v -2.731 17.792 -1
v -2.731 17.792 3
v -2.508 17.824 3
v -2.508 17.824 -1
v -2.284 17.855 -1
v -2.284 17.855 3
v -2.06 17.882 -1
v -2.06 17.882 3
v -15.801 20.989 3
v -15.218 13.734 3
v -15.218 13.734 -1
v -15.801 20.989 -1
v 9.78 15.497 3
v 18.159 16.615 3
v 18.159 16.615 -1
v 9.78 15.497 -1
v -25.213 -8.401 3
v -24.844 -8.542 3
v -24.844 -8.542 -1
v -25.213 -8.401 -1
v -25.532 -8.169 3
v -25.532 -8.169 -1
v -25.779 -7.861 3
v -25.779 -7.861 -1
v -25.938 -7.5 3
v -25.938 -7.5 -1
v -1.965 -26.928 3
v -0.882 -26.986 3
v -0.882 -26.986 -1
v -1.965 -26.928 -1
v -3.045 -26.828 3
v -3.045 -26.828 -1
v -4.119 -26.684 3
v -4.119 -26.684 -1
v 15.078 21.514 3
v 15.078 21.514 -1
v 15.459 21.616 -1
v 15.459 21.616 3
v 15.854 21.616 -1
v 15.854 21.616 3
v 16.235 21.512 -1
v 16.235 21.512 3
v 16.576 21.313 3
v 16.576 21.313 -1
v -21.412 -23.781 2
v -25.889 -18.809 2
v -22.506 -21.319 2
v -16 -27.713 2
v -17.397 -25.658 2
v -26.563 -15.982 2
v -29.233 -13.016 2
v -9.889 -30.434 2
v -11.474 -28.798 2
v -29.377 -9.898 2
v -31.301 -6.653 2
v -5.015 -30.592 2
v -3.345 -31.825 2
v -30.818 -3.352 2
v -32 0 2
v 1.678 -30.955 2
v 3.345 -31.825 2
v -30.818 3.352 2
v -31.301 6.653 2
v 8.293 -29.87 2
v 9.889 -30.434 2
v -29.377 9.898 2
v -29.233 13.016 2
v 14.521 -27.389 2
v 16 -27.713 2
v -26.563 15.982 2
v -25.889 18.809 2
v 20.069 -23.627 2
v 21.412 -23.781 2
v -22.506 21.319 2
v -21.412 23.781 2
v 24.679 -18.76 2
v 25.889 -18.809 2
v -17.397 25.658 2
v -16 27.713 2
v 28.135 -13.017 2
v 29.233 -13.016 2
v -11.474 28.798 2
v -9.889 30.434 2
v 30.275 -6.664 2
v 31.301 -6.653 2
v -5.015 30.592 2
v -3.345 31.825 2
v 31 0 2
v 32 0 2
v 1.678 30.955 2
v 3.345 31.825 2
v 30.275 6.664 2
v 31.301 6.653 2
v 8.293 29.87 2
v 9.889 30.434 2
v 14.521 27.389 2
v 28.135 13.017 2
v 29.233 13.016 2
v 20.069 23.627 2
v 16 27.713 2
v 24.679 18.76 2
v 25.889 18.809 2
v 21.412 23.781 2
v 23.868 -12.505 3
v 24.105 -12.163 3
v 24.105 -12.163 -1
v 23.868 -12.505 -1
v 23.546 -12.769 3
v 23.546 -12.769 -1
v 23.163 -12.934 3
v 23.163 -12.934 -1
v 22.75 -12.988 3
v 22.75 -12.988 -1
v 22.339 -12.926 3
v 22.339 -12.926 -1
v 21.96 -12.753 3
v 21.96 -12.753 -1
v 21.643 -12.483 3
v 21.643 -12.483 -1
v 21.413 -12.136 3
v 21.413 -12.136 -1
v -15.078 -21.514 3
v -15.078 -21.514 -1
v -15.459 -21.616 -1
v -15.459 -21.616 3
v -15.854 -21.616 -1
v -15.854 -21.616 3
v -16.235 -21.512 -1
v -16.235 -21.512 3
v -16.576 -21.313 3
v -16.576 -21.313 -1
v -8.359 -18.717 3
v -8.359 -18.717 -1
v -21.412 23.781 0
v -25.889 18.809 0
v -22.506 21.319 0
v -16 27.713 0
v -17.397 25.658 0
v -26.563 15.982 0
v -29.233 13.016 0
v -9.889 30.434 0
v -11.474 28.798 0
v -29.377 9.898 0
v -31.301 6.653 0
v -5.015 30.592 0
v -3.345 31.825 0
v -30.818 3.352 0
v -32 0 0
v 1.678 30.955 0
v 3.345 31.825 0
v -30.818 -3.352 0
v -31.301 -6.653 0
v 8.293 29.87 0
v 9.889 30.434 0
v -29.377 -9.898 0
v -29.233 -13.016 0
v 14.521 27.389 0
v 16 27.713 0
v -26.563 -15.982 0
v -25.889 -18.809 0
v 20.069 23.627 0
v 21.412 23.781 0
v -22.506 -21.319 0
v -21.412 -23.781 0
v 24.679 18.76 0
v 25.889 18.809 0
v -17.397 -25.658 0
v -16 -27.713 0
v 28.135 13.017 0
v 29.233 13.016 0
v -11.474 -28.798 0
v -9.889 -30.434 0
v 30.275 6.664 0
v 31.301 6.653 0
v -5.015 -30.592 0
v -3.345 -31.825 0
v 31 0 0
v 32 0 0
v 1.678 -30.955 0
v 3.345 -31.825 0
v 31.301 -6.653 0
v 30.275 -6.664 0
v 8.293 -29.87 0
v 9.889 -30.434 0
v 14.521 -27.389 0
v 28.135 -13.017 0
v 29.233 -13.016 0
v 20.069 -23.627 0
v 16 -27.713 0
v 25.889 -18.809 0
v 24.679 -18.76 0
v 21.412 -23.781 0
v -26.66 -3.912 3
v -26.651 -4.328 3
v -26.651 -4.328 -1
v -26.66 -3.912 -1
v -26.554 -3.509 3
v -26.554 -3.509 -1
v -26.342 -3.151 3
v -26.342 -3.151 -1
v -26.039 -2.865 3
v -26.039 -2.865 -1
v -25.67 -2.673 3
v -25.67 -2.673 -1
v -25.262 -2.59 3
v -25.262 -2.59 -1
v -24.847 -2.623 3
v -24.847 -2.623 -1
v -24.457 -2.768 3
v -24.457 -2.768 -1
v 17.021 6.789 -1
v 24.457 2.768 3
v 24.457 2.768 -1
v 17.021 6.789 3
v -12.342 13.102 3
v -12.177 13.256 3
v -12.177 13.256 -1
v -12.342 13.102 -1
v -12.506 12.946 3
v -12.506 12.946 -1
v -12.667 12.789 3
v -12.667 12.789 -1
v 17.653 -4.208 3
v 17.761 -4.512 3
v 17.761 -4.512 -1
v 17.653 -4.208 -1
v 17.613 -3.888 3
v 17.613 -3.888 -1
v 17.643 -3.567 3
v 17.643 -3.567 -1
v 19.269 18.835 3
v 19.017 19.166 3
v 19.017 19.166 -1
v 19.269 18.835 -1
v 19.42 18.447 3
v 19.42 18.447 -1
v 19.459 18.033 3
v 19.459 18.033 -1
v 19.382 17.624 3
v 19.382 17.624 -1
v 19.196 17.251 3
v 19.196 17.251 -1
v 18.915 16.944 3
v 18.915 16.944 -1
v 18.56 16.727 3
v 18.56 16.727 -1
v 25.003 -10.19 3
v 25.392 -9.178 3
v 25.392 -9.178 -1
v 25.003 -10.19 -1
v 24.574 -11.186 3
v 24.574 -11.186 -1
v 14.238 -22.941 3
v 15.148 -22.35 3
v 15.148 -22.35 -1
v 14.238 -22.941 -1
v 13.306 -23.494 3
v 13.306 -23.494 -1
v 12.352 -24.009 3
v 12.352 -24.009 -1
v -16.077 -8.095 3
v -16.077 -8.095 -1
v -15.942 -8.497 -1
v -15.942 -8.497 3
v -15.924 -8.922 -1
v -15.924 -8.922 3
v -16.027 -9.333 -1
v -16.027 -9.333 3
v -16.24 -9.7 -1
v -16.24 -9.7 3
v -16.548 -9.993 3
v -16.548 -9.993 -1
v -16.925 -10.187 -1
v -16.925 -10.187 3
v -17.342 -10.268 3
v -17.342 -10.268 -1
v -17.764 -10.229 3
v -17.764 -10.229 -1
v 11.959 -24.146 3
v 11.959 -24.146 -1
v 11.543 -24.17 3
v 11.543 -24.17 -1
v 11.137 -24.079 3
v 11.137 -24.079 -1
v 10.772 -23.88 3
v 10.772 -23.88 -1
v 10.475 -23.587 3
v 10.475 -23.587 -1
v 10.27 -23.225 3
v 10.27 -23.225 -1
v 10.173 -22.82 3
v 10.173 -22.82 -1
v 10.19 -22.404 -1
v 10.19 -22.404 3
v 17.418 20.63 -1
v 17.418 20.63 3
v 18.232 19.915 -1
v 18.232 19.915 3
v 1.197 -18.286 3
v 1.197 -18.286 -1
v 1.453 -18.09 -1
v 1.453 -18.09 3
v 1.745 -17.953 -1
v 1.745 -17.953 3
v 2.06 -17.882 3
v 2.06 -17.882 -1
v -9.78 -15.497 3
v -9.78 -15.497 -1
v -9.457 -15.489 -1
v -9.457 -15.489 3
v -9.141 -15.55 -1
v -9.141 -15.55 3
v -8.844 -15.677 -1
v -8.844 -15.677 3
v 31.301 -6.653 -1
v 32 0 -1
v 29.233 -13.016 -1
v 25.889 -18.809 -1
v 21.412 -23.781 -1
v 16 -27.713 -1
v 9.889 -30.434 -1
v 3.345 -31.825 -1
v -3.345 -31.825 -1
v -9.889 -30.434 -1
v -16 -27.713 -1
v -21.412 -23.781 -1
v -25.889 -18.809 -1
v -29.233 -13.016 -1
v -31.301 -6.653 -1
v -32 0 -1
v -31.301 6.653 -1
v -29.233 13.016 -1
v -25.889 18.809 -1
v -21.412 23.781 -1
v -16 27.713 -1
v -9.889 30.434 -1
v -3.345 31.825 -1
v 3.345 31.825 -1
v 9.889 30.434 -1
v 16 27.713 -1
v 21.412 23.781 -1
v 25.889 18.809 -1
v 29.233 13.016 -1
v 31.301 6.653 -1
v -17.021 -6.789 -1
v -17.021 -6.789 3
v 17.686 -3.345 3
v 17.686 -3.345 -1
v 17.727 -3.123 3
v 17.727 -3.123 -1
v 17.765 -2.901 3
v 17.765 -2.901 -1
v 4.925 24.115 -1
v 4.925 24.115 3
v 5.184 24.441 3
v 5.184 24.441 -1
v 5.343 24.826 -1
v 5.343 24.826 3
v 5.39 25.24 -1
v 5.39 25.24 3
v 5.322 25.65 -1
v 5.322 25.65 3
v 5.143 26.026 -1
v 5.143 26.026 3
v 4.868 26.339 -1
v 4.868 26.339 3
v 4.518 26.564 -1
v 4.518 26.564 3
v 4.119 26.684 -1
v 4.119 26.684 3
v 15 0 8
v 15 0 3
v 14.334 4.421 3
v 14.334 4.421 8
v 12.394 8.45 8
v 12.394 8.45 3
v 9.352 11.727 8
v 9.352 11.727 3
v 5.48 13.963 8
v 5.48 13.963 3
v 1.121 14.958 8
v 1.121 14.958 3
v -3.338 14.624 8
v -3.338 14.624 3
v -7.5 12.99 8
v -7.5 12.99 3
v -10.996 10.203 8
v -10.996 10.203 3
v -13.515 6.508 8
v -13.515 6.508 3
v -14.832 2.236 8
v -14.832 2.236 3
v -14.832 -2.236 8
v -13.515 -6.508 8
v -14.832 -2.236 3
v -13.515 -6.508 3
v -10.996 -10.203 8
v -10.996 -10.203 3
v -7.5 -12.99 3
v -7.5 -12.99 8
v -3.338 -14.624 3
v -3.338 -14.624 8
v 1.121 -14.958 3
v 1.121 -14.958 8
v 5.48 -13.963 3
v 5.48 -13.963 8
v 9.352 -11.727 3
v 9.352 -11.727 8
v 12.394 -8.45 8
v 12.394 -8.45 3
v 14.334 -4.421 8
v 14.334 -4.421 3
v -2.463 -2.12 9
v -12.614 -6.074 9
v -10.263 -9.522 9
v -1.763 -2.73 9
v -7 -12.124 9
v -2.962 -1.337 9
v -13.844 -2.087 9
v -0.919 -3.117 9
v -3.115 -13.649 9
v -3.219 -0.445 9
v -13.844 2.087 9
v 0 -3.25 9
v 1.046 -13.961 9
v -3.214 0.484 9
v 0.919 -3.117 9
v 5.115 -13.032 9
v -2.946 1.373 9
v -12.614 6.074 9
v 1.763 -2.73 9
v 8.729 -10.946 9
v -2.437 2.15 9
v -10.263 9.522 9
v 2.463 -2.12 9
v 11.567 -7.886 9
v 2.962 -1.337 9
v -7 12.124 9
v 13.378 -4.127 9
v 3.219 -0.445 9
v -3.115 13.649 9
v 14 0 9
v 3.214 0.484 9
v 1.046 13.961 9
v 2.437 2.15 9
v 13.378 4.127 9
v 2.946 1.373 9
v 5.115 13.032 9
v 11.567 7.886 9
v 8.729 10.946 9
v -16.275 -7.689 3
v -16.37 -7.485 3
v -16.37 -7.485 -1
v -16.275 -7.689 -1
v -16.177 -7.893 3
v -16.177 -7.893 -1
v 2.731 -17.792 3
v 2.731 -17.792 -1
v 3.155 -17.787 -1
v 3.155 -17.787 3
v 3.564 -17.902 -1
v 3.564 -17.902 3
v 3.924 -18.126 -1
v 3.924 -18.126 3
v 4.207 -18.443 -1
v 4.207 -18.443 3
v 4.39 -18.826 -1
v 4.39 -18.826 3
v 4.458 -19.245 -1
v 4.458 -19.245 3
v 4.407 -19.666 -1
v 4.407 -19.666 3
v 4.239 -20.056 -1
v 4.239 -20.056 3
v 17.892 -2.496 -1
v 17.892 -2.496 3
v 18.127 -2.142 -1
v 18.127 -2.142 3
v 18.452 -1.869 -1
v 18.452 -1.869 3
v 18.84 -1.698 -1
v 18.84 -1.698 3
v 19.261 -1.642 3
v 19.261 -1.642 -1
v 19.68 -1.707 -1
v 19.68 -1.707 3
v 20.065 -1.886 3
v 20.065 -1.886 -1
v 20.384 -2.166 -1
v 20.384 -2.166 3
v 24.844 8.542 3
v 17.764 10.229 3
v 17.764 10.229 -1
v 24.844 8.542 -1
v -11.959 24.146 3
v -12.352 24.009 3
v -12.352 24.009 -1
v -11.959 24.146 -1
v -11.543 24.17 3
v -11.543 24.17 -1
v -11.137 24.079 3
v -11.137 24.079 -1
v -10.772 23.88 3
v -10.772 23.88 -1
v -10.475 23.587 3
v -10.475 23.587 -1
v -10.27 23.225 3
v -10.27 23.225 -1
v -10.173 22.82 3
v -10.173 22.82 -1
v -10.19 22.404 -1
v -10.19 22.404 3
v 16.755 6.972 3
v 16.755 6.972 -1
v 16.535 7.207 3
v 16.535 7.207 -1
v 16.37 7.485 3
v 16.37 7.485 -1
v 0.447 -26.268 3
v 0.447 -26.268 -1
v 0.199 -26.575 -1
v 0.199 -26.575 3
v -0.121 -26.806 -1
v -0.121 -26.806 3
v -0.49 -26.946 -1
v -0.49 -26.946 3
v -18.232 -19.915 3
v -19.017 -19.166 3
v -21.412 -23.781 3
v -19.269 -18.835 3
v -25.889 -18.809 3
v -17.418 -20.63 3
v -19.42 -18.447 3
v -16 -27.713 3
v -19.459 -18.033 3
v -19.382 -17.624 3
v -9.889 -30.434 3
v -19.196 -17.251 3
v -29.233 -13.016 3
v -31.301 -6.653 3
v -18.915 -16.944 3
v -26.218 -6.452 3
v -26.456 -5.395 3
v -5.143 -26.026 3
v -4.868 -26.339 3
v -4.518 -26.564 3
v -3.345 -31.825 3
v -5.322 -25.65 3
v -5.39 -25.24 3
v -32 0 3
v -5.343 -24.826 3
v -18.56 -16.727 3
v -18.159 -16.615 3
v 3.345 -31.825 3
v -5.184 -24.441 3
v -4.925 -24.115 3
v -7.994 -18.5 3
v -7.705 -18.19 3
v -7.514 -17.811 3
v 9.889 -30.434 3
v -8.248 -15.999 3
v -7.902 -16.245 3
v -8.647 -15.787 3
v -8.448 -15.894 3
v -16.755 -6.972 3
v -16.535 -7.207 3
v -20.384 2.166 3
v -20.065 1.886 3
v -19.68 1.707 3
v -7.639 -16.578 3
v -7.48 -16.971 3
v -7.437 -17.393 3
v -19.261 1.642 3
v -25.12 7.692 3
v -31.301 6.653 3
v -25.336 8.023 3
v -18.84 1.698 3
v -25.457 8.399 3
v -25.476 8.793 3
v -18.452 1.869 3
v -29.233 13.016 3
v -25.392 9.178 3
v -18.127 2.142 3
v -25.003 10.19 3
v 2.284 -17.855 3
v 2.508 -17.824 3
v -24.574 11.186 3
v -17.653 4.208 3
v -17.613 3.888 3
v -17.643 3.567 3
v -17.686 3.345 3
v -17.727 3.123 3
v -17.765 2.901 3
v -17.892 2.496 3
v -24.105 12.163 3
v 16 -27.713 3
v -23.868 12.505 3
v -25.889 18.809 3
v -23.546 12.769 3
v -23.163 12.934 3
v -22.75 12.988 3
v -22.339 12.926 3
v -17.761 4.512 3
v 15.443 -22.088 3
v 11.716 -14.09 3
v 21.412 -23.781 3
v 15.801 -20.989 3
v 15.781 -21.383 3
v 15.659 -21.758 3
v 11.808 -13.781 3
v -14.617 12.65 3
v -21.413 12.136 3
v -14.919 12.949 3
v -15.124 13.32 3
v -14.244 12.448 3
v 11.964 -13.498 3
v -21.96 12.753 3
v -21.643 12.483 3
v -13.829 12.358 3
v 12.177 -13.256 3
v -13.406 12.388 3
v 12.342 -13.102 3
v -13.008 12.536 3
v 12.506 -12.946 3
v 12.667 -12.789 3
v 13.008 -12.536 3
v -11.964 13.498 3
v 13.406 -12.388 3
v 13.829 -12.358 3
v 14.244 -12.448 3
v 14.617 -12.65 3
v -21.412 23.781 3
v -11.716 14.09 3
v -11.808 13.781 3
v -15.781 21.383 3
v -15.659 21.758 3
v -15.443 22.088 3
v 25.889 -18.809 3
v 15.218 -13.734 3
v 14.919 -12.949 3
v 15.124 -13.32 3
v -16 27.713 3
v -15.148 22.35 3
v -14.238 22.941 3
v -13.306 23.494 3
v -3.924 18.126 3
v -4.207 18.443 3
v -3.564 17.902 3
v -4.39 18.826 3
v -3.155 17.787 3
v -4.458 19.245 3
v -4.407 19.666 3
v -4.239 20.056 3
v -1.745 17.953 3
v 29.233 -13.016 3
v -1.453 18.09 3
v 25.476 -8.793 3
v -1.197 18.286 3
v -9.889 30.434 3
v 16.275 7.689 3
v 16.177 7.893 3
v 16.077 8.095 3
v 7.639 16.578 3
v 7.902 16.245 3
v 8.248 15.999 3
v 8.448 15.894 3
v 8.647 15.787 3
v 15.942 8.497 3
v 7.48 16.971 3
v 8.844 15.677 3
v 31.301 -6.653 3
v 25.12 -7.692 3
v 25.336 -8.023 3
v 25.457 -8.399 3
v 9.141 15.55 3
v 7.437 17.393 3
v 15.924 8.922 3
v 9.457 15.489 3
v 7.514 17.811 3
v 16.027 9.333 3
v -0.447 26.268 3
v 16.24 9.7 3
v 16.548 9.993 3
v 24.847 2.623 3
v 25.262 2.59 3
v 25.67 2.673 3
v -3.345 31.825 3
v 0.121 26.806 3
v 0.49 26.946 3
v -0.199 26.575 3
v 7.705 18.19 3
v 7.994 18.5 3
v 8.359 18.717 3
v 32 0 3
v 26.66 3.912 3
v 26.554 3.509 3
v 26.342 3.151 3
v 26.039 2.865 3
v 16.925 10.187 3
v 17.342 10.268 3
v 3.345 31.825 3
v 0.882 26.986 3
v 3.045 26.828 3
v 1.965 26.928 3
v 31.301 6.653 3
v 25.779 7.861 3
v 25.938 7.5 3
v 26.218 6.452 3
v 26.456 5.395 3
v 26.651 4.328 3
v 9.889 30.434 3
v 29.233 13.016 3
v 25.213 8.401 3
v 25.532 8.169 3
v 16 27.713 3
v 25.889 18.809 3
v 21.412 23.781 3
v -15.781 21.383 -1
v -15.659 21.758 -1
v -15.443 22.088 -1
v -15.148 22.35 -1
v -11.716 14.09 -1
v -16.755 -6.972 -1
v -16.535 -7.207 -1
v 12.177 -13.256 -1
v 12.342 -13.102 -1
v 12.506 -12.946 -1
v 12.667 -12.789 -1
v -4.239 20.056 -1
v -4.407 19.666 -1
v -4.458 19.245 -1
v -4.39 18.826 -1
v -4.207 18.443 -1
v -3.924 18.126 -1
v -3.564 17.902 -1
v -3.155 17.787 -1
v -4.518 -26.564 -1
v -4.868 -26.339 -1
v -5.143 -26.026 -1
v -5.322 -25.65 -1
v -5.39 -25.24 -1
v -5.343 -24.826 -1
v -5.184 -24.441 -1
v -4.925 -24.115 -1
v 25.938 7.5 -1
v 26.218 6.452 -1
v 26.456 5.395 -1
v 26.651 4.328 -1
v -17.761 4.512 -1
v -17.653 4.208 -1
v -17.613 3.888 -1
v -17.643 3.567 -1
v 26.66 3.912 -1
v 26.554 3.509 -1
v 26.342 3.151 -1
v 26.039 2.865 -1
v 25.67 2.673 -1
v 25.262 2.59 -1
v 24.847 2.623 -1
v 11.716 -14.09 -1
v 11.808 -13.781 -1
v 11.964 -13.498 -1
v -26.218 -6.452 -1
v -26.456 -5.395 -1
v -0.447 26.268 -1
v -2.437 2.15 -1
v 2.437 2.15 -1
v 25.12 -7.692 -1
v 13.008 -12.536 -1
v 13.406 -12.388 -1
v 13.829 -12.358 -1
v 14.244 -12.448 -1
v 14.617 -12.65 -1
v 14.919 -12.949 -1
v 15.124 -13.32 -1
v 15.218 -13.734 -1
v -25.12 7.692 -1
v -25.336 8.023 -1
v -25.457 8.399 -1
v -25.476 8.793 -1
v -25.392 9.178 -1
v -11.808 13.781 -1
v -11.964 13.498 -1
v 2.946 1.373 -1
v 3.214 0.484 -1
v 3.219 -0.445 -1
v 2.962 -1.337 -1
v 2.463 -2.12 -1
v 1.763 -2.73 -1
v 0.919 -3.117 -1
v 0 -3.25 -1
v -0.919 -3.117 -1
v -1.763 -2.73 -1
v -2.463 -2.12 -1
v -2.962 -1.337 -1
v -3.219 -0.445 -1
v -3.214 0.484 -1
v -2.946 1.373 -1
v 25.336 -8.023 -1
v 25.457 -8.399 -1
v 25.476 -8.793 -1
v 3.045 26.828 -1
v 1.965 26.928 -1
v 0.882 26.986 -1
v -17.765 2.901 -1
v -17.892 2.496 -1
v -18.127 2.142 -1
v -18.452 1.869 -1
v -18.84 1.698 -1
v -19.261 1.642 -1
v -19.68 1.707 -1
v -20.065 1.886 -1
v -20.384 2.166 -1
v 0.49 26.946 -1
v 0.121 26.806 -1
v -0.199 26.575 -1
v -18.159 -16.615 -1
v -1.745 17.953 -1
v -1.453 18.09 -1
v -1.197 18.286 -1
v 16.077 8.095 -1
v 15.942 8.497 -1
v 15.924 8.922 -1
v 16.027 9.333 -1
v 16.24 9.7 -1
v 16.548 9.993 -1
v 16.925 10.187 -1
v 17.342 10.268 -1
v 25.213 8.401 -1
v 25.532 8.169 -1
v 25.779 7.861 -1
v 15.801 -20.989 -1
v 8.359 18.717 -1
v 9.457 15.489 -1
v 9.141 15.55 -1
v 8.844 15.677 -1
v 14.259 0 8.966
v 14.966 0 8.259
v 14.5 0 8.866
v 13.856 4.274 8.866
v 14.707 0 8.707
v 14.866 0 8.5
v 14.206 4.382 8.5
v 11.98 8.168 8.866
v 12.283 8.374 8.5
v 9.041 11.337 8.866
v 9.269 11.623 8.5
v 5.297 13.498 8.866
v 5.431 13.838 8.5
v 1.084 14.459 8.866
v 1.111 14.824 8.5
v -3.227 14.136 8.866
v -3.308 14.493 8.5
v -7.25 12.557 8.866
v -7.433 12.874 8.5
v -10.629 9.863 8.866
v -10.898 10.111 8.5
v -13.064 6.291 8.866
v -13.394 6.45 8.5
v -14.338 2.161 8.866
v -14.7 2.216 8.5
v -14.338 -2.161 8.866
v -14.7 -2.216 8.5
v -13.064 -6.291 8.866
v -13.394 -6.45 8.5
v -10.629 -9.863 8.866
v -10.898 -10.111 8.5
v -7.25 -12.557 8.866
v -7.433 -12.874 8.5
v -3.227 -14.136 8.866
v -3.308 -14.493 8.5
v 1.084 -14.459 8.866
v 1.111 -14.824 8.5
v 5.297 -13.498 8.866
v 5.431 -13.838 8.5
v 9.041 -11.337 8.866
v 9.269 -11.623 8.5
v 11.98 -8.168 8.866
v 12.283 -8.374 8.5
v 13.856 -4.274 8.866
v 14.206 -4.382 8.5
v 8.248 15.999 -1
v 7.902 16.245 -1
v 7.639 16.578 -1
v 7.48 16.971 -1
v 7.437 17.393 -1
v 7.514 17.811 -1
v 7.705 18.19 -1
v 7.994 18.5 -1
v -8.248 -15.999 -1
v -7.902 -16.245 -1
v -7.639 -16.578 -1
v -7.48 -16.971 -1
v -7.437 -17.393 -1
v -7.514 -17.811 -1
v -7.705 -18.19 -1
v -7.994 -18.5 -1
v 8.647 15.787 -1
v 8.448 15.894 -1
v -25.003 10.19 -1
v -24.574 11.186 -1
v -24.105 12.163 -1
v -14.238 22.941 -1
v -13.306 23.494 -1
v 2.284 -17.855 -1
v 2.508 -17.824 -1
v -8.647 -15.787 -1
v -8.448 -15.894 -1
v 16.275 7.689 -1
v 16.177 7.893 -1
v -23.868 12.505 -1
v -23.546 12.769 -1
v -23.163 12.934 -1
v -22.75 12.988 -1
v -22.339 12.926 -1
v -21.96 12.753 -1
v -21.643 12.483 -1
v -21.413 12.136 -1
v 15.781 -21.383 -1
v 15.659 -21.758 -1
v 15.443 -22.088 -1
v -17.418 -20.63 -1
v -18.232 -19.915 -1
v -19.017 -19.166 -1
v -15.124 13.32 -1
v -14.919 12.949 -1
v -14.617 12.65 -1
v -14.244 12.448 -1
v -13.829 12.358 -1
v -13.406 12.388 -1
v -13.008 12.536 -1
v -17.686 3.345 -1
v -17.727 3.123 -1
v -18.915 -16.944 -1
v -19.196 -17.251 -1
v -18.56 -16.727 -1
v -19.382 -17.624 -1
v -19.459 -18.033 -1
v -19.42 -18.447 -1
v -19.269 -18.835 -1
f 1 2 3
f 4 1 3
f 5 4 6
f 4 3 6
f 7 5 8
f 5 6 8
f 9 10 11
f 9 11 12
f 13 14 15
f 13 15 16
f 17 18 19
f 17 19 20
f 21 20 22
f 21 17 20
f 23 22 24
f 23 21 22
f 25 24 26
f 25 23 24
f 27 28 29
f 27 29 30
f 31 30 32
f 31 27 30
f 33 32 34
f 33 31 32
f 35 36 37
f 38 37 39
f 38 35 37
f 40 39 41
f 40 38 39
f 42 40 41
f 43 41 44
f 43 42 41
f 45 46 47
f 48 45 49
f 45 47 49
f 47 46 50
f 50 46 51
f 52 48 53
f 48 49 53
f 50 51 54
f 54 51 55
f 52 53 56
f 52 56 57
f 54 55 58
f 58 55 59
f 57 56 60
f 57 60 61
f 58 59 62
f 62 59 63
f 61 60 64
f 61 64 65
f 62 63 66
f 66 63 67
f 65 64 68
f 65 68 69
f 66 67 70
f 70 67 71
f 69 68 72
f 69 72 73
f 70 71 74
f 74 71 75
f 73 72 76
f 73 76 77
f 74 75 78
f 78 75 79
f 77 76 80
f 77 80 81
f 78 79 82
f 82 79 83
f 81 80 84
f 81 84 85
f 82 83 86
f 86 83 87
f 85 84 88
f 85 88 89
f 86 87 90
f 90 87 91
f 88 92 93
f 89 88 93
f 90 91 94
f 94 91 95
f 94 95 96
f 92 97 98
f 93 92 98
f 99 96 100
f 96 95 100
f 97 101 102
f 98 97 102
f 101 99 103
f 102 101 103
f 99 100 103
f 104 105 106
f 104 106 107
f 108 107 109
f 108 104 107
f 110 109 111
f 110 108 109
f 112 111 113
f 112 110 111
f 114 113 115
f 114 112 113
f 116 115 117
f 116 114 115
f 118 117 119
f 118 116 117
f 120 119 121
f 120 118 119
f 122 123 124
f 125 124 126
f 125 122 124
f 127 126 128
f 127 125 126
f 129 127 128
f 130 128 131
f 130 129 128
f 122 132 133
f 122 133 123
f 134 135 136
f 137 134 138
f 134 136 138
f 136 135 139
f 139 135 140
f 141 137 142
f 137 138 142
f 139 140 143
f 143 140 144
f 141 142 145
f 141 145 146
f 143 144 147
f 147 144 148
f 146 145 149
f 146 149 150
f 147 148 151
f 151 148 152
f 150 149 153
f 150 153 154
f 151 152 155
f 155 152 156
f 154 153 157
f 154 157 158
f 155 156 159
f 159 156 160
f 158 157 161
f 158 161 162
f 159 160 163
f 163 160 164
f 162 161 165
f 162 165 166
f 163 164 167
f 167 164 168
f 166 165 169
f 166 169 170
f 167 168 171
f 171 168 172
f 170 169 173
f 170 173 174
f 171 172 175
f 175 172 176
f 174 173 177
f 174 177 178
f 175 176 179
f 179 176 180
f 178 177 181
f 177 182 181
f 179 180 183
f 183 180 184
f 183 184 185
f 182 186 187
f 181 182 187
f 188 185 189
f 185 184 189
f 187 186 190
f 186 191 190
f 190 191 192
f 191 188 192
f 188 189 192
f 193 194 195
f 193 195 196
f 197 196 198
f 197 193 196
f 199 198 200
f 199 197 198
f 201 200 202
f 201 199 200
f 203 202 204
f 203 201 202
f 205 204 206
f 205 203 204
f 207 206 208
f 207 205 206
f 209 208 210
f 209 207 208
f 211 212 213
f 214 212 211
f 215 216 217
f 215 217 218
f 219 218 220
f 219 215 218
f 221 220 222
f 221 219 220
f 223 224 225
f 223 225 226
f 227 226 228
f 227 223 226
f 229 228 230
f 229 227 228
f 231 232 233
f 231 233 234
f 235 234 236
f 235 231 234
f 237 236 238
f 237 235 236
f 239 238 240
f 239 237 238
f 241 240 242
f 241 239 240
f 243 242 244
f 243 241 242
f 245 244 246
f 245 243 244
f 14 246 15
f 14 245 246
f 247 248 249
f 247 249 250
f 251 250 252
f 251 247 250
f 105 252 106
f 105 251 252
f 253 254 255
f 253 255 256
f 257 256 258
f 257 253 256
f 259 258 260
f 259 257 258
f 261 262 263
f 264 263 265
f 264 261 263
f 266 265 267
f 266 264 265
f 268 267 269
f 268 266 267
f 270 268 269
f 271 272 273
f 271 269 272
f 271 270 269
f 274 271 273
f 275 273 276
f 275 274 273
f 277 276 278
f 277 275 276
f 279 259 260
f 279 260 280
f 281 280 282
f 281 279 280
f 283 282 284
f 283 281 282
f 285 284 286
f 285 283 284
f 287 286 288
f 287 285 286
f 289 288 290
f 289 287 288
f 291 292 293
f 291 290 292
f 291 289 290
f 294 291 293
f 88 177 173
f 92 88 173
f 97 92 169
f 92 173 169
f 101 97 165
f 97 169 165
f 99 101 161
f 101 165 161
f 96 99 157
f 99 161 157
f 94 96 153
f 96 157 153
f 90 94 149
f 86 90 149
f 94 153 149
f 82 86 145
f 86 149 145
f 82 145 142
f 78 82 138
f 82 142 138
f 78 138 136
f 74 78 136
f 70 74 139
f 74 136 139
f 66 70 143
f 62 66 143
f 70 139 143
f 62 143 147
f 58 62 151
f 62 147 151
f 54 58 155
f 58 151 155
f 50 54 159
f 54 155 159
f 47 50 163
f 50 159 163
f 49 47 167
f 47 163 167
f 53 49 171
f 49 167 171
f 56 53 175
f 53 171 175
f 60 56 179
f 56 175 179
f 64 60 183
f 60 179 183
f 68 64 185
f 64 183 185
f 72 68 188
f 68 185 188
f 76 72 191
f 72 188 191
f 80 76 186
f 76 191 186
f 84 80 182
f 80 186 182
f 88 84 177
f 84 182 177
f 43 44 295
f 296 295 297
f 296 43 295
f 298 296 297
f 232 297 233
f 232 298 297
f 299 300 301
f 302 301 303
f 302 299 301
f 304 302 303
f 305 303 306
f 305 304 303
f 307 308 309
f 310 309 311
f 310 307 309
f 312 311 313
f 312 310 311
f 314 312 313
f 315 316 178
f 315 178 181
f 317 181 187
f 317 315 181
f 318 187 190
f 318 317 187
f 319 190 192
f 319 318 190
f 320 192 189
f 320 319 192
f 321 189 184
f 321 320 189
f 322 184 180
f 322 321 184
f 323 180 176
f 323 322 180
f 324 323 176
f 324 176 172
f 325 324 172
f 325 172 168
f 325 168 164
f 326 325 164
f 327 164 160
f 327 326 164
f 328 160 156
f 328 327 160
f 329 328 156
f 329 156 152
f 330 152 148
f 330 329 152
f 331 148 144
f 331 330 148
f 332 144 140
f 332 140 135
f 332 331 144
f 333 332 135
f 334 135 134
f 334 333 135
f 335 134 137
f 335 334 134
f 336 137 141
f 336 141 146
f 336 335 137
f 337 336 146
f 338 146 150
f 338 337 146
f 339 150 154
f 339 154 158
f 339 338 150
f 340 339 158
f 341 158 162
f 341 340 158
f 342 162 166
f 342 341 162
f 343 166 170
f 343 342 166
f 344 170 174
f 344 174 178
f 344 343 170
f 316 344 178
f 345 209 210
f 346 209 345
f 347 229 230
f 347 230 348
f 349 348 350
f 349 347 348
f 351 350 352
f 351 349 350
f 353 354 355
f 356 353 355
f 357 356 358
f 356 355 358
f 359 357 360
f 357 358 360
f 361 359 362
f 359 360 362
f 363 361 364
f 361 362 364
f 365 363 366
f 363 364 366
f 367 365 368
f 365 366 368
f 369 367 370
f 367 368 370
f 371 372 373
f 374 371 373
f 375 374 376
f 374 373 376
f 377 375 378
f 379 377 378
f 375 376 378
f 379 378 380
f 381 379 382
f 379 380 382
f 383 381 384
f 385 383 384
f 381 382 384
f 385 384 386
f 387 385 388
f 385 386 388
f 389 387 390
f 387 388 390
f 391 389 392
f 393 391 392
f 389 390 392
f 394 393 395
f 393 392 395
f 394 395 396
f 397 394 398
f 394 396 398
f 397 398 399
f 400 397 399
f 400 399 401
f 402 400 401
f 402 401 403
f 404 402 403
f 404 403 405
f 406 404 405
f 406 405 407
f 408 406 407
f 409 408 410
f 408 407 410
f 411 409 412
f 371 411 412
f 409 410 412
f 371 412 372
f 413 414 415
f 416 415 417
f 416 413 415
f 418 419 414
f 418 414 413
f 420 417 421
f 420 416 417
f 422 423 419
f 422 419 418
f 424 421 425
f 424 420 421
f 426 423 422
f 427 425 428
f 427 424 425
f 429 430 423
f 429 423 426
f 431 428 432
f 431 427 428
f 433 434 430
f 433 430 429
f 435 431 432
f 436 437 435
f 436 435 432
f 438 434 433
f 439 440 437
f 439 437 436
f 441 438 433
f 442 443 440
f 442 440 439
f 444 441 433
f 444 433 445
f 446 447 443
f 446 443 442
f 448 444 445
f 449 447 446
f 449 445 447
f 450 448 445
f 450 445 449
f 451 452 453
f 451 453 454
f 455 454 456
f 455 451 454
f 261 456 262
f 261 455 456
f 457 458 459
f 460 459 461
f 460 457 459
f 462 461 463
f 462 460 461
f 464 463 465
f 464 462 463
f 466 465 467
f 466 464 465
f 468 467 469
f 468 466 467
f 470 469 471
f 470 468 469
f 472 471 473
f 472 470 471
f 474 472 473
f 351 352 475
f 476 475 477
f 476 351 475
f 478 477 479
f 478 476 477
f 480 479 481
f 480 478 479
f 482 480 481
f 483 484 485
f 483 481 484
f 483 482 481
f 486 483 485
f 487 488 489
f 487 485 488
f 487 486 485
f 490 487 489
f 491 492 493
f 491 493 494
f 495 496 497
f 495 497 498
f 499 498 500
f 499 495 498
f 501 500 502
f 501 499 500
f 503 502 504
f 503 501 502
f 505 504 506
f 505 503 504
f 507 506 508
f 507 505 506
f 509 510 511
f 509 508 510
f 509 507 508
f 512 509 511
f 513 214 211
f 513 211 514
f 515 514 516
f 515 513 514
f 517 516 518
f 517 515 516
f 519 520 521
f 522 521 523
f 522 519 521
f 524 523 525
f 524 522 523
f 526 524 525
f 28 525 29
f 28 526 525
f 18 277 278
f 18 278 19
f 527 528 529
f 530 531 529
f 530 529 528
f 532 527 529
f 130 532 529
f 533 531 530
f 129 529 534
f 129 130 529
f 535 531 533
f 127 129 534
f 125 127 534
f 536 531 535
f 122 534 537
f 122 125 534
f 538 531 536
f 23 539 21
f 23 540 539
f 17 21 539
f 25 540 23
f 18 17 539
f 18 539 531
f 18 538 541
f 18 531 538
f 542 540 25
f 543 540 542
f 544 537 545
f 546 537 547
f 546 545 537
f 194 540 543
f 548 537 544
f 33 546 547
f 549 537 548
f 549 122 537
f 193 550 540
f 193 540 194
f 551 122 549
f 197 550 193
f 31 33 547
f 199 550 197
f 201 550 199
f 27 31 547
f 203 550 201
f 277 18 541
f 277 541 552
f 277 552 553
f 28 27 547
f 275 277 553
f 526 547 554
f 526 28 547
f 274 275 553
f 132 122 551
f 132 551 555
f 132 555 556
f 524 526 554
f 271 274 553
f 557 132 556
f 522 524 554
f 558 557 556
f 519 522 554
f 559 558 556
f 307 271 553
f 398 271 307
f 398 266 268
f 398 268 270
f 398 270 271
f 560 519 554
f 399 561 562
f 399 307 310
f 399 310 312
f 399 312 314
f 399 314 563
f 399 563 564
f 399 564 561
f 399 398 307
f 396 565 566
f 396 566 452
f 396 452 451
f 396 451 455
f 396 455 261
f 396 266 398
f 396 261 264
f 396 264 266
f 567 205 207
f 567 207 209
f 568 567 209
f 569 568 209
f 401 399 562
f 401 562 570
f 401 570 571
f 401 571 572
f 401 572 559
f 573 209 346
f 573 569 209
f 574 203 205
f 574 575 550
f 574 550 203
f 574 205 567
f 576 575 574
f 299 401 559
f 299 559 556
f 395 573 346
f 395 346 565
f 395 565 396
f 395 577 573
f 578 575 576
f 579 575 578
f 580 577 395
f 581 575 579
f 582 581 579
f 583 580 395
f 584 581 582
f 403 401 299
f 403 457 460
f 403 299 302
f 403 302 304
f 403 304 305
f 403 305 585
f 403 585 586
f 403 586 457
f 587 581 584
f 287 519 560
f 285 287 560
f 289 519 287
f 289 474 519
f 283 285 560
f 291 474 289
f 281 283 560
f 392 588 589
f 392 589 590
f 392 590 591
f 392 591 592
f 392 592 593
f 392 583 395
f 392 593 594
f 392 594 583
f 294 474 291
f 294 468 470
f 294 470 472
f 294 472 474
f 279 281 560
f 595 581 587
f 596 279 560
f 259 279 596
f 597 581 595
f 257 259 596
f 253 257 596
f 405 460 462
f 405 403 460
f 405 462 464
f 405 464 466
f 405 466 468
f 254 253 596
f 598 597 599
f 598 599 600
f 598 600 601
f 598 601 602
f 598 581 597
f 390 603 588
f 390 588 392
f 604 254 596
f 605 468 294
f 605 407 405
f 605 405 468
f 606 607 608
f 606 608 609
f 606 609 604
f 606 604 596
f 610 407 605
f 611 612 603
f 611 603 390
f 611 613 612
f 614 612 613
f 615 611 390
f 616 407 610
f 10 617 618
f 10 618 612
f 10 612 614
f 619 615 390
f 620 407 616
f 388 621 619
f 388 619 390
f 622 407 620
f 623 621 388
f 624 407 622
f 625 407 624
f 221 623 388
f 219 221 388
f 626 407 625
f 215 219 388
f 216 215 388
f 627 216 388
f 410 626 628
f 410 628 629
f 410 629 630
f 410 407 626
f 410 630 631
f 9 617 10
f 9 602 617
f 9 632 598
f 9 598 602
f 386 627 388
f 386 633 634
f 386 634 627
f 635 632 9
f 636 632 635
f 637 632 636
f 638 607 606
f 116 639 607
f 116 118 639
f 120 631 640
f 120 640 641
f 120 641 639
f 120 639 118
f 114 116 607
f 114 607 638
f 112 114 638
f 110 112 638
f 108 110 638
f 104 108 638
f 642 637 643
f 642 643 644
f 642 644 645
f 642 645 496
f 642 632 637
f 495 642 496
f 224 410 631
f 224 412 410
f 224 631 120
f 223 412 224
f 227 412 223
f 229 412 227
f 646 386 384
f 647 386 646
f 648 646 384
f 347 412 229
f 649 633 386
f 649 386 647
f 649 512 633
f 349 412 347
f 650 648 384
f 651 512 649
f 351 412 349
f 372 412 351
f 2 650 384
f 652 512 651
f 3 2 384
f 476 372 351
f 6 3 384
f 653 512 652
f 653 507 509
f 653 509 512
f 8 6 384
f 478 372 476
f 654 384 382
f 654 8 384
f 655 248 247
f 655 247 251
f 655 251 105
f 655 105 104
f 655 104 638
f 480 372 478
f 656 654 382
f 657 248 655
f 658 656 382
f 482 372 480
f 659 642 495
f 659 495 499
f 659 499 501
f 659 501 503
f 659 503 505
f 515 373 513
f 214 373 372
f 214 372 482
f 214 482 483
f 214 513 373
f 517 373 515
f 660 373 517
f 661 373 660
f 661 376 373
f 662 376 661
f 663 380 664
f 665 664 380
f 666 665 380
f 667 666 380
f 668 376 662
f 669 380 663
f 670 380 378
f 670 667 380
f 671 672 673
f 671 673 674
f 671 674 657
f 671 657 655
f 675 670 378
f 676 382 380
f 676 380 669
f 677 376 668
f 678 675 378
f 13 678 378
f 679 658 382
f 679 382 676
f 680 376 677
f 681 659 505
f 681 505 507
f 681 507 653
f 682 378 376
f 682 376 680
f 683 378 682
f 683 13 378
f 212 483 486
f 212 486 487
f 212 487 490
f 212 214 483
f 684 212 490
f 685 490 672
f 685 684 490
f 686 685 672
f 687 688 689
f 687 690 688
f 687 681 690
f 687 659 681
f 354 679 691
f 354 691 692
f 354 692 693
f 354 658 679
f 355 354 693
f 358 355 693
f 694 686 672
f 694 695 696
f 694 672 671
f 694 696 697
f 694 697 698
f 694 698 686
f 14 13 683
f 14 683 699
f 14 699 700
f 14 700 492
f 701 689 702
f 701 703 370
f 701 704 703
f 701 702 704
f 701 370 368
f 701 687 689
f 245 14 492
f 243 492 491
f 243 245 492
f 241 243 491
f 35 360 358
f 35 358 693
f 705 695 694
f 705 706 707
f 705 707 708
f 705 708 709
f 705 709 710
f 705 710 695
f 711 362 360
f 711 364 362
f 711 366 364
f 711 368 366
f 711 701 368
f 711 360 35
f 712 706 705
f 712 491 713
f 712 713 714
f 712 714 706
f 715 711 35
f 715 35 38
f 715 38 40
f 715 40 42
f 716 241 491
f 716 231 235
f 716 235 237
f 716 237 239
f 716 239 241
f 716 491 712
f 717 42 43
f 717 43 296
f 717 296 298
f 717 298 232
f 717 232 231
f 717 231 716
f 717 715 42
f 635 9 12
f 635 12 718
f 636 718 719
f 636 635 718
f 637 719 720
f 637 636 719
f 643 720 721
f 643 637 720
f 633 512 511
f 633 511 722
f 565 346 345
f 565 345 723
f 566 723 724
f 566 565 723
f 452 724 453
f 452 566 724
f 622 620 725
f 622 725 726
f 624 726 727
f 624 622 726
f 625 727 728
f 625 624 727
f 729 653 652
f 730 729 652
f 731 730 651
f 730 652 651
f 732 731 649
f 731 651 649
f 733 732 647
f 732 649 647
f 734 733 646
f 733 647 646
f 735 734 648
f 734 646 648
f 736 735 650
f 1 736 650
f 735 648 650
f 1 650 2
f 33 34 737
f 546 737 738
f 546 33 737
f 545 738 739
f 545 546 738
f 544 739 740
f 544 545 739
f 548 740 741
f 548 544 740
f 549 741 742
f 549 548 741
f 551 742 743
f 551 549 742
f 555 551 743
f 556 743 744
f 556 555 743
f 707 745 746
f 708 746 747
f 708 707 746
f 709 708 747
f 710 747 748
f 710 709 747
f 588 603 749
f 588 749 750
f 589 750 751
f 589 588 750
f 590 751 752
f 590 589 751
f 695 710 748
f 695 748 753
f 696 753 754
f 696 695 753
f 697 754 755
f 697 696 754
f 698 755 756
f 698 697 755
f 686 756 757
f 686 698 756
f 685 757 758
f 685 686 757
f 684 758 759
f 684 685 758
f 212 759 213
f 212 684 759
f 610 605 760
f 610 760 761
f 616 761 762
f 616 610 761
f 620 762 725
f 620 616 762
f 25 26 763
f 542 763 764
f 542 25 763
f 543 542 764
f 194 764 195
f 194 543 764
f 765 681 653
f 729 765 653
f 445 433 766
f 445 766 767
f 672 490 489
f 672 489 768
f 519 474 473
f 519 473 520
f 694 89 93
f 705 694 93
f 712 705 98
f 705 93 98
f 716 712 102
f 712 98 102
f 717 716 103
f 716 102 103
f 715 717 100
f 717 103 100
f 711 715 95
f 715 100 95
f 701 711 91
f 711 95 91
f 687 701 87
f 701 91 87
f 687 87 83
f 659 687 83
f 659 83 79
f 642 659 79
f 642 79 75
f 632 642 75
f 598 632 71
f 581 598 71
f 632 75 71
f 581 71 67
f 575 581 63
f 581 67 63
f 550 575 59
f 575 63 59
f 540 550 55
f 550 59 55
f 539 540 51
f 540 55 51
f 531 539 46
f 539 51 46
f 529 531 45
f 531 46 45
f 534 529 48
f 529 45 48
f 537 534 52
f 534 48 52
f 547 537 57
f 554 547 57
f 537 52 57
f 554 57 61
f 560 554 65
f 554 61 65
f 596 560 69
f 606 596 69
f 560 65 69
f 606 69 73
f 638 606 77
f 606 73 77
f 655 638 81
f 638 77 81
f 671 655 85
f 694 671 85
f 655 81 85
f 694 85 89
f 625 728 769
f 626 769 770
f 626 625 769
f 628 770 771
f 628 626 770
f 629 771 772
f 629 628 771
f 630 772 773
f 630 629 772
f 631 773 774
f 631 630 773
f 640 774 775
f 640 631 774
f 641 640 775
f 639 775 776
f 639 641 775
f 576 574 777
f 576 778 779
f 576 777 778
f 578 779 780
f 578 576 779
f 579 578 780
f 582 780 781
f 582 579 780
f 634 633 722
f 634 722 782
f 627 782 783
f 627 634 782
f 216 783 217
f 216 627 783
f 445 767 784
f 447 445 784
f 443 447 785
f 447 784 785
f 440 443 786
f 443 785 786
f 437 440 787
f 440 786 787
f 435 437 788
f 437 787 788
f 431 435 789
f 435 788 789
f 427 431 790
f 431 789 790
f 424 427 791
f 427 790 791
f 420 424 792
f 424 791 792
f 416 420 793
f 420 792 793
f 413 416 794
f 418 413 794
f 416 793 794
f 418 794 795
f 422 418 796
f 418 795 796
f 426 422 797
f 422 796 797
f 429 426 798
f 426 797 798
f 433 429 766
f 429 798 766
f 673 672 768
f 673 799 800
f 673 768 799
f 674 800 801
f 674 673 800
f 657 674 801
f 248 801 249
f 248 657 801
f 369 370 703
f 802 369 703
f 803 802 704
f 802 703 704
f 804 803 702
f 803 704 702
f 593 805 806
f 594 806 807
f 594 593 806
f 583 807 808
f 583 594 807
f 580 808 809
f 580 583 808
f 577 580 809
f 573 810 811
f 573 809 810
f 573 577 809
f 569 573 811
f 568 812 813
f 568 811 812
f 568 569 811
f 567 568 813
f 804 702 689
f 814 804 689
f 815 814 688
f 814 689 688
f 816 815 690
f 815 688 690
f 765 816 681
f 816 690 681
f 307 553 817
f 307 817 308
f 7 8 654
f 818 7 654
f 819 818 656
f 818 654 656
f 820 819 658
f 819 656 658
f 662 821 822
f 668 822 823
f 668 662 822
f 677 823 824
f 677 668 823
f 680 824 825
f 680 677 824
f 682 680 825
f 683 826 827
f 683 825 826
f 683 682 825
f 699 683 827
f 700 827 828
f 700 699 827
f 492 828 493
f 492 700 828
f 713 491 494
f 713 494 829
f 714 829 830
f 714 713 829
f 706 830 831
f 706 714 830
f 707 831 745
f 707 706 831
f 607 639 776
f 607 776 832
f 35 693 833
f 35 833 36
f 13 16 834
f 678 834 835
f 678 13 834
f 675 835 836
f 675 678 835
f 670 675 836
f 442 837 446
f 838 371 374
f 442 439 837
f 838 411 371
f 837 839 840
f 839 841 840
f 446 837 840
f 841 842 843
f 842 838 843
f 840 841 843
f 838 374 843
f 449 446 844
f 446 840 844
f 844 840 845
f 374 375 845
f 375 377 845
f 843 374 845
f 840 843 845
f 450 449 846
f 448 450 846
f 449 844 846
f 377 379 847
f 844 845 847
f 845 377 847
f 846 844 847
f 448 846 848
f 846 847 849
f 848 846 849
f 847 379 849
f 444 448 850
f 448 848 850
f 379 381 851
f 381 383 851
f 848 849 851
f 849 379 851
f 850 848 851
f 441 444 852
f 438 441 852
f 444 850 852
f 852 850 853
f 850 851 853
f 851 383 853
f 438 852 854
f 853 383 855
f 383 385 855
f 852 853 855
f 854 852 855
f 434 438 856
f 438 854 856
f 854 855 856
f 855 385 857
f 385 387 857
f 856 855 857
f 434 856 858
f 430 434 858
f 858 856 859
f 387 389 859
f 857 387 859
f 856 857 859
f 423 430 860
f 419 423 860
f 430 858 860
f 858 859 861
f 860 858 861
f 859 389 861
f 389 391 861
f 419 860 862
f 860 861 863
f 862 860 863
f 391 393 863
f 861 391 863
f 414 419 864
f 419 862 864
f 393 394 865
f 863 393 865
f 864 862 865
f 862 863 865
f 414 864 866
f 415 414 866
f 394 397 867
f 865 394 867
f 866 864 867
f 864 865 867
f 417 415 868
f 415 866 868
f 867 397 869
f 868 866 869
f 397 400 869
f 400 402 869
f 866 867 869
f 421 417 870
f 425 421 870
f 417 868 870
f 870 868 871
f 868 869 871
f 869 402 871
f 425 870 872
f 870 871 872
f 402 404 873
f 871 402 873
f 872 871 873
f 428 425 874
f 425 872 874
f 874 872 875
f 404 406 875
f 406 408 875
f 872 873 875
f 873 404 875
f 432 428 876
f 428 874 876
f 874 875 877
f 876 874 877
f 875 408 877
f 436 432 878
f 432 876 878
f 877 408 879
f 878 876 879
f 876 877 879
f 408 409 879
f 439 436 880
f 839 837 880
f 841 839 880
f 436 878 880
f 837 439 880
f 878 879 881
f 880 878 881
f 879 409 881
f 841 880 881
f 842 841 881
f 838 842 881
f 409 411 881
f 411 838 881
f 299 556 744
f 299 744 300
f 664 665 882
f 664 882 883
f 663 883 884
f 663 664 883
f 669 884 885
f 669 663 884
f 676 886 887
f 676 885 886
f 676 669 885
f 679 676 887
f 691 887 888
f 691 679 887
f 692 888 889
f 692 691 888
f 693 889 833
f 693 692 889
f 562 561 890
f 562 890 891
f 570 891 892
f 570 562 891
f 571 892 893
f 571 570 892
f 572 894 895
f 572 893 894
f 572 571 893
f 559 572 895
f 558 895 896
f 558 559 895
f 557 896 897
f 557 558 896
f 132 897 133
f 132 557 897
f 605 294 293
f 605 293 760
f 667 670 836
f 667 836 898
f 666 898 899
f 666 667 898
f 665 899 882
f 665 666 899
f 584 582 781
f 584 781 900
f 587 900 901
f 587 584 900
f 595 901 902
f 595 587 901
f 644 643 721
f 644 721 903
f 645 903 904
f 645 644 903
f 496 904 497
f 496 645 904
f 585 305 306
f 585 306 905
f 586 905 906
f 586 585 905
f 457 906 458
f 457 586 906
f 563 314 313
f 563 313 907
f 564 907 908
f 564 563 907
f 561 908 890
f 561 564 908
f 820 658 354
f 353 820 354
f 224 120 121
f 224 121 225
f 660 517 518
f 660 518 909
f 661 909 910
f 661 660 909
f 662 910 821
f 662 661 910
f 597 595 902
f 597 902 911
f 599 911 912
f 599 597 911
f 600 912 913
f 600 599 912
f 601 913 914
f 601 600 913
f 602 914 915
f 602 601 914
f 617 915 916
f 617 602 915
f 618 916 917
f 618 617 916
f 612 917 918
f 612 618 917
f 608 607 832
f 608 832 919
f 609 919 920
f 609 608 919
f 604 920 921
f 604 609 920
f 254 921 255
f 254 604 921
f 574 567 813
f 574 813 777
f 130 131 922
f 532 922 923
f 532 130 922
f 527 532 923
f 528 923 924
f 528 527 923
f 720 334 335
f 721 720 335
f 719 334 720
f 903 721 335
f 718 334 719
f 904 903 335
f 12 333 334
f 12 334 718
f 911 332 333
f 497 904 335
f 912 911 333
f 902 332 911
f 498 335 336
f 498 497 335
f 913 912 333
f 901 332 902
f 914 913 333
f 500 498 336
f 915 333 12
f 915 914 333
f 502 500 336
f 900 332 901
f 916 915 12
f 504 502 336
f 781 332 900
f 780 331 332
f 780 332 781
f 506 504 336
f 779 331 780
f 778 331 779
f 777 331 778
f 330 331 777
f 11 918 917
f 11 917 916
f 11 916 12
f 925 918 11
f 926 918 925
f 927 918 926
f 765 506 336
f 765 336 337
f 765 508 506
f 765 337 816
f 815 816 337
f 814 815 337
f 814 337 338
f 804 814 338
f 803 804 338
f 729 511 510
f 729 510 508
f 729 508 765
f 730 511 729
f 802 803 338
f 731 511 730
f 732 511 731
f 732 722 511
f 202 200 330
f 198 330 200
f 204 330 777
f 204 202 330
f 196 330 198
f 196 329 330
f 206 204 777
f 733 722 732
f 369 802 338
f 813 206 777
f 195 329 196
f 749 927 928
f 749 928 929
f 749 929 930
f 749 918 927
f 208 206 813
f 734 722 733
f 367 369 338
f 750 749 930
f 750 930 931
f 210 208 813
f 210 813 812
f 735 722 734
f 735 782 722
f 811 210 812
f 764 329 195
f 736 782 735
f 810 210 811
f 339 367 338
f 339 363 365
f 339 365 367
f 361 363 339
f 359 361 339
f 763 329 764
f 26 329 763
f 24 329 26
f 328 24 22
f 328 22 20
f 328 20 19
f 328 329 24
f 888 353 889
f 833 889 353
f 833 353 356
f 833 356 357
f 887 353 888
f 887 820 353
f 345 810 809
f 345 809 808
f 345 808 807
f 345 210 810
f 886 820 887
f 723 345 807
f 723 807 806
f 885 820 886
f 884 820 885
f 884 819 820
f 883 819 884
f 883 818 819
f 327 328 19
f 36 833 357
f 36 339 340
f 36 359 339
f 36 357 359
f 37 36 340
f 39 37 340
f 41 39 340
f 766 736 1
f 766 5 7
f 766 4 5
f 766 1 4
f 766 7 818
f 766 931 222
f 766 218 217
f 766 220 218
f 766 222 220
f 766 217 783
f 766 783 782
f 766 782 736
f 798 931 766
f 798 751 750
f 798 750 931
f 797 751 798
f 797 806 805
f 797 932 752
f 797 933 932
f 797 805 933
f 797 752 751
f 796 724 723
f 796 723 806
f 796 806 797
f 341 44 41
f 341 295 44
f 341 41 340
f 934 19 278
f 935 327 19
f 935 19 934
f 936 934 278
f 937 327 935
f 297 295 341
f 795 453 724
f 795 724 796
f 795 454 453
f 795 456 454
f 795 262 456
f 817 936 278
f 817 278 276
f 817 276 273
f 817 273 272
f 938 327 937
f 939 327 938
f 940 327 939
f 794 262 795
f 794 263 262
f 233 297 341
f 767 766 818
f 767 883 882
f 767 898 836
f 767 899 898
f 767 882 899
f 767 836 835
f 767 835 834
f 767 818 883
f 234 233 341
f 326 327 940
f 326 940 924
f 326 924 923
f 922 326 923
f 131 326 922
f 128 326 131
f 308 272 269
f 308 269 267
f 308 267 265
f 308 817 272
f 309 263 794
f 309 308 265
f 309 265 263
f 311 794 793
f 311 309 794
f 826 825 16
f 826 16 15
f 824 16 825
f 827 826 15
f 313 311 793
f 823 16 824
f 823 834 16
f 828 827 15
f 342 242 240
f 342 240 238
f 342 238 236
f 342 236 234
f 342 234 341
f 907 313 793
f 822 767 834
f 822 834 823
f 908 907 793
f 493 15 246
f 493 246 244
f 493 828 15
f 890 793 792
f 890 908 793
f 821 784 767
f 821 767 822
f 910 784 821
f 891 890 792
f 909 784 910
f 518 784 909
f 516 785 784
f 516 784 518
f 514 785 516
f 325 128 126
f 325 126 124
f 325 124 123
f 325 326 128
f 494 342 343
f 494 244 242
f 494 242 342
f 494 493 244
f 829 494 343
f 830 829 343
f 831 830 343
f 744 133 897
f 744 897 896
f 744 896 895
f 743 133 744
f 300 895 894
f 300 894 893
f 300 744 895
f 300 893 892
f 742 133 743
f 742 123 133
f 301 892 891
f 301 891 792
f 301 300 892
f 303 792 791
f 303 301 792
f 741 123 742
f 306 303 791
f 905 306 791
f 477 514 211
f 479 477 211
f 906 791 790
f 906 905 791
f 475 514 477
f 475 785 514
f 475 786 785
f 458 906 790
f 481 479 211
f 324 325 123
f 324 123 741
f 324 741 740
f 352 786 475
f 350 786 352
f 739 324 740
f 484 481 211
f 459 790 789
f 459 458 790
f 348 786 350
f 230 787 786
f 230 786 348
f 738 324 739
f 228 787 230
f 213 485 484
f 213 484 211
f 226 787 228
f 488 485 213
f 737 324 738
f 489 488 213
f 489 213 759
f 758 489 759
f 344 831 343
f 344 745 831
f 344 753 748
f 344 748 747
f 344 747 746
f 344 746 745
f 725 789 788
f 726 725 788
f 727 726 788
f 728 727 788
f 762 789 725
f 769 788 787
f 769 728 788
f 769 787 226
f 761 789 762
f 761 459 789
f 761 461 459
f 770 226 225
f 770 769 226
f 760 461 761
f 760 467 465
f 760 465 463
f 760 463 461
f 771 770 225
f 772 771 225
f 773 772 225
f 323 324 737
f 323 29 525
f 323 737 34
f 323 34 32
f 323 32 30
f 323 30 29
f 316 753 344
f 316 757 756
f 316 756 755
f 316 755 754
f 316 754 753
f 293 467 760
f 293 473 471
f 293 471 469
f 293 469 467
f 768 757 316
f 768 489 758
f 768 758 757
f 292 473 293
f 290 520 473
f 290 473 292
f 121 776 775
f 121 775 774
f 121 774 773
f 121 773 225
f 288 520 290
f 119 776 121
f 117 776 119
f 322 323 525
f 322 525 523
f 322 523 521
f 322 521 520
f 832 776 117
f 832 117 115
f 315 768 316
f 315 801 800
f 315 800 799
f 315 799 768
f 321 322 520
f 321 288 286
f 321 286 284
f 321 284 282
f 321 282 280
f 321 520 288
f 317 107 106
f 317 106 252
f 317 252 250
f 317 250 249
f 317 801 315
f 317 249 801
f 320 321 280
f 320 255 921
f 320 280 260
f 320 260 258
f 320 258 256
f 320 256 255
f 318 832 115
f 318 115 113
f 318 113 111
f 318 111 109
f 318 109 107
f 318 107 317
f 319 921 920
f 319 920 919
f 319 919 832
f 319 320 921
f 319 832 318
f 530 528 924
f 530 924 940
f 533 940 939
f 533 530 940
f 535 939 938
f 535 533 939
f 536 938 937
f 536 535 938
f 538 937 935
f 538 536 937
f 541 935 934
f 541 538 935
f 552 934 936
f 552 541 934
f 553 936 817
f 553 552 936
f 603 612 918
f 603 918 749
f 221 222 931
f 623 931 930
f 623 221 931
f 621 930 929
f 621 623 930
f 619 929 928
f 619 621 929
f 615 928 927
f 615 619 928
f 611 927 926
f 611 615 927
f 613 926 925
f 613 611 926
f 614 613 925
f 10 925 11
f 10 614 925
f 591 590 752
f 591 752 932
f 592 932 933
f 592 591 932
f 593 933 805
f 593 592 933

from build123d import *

# Parameters (mm, degrees)
SKETCH_1_R          = 31
EXTRUDE_2_DEPTH     = 2
SKETCH_2_R          = 32
EXTRUDE_3_DEPTH     = 1
EXTRUDE_START       = 1
SKETCH_3_R          = 32
EXTRUDE_4_DEPTH     = 1
SKETCH_6_R          = 15
EXTRUDE_6_DEPTH     = 6
CUT_EXTRUDE_4_DEPTH = 47.346520905
CUT_EXTRUDE_5_DEPTH = 46.650848842
FILLET_1_R          = 1


with BuildPart() as part:
    # Эскиз1 → Бобышка-Вытянуть2 (new body)
    with BuildSketch(Plane.XY):
        Circle(SKETCH_1_R)
    extrude(amount=EXTRUDE_2_DEPTH)

    # Эскиз2 → Бобышка-Вытянуть3 (add)
    with BuildSketch(Plane.XY.offset(2)):
        Circle(SKETCH_2_R)
    extrude(amount=EXTRUDE_3_DEPTH)

    # Эскиз3 → Бобышка-Вытянуть4 (add)
    with BuildSketch(Plane(origin=(0, 0, 0), x_dir=(-1, 0, 0), z_dir=(0, 0, -1)).offset(EXTRUDE_START)):
        with Locations(Location((0, 0, 0), (0, 0, 180))):
            Circle(SKETCH_3_R)
    extrude(amount=-EXTRUDE_4_DEPTH)

    # Эскиз6 → Бобышка-Вытянуть6 (add)
    with BuildSketch(Plane.XY.offset(3)):
        Circle(SKETCH_6_R)
    extrude(amount=EXTRUDE_6_DEPTH)

    # Эскиз4 → Вырез-Вытянуть4 (cut, through all)
    with BuildSketch(Plane(origin=(0, 0, -1), x_dir=(-1, 0, 0), z_dir=(0, 0, -1))):
        with BuildLine():
            Line((2.437211521, 2.15), (-2.437211521, 2.15))
            ThreePointArc((-2.437211521, 2.15), (0, -3.25), (2.437211521, 2.15))
        make_face()
    extrude(amount=-CUT_EXTRUDE_4_DEPTH, mode=Mode.SUBTRACT)

    # Эскиз7 → Вырез-Вытянуть5 (cut, through all)
    with BuildSketch(Plane.XY.offset(3)):
        with BuildLine():
            Line((-1.196907114, 18.285650075), (4.924848525, 24.115212052))
            ThreePointArc((4.924848525, 24.115212052), (5.321696385, 25.650338094), (4.119277954, 26.683919299))
            ThreePointArc((4.119277954, 26.683919299), (2.505413728, 26.883506134), (0.882461302, 26.985575074))
            ThreePointArc((0.882461302, 26.985575074), (0.120845833, 26.806306653), (-0.446883349, 26.267902657))
            Line((-0.446883349, 26.267902657), (-4.238854139, 20.055785457))
            ThreePointArc((-4.238854139, 20.055785457), (-4.207002942, 18.442797843), (-2.730955491, 17.791623931))
            ThreePointArc((-2.730955491, 17.791623931), (-2.395744761, 17.839854457), (-2.059685964, 17.881769871))
            ThreePointArc((-2.059685964, 17.881769871), (-1.595382366, 18.013397906), (-1.196907114, 18.285650075))
        make_face()
        with BuildLine():
            Line((8.35918988, 18.717007219), (15.078349566, 21.513851098))
            ThreePointArc((15.078349566, 21.513851098), (15.854118052, 21.61572624), (16.575649243, 21.313091099))
            ThreePointArc((16.575649243, 21.313091099), (17.828650719, 20.276568091), (19.016980106, 19.166493358))
            ThreePointArc((19.016980106, 19.166493358), (19.382233263, 17.623544777), (18.158852151, 16.61486304))
            Line((18.158852151, 16.61486304), (9.779717246, 15.496926014))
            ThreePointArc((9.779717246, 15.496926014), (9.297318186, 15.510887259), (8.844319668, 15.677308749))
            ThreePointArc((8.844319668, 15.677308749), (8.547805127, 15.840928871), (8.248264758, 15.99894148))
            ThreePointArc((8.248264758, 15.99894148), (7.436867708, 17.393351165), (8.35918988, 18.717007219))
        make_face()
        with BuildLine():
            Line((17.764307483, 10.228968392), (24.844165441, 8.542239649))
            ThreePointArc((24.844165441, 8.542239649), (25.531656036, 8.168673095), (25.937502559, 7.499730729))
            ThreePointArc((25.937502559, 7.499730729), (26.341949109, 5.924670212), (26.650842222, 4.328118399))
            ThreePointArc((26.650842222, 4.328118399), (26.039415812, 2.865156358), (24.456791453, 2.768201066))
            Line((24.456791453, 2.768201066), (17.020822019, 6.788902937))
            ThreePointArc((17.020822019, 6.788902937), (16.638759195, 7.083744875), (16.370095793, 7.484648537))
            ThreePointArc((16.370095793, 7.484648537), (16.226383986, 7.791306871), (16.076928218, 8.095207168))
            ThreePointArc((16.076928218, 8.095207168), (16.240107663, 9.700235519), (17.764307483, 10.228968392))
        make_face()
        with BuildLine():
            Line((20.384063414, -2.166188691), (25.12035454, -7.692217006))
            ThreePointArc((25.12035454, -7.692217006), (25.456969204, -8.398535529), (25.392111481, -9.178271872))
            ThreePointArc((25.392111481, -9.178271872), (24.79351827, -10.690250315), (24.104988437, -12.16345068))
            ThreePointArc((24.104988437, -12.16345068), (22.750426568, -12.987624407), (21.413067675, -12.135819628))
            Line((21.413067675, -12.135819628), (17.760551297, -4.512250316))
            ThreePointArc((17.760551297, -4.512250316), (17.624759723, -4.049147284), (17.643051725, -3.566893022))
            ThreePointArc((17.643051725, -3.566893022), (17.707035676, -3.234329538), (17.764751533, -2.900621137))
            ThreePointArc((17.764751533, -2.900621137), (18.840178472, -1.698040395), (20.384063414, -2.166188691))
        make_face()
        with BuildLine():
            Line((15.21779995, -13.733935321), (15.801422014, -20.988508213))
            ThreePointArc((15.801422014, -20.988508213), (15.658585386, -21.757789037), (15.147796863, -22.350486576))
            ThreePointArc((15.147796863, -22.350486576), (13.774806152, -23.221858571), (12.351848368, -24.00899502))
            ThreePointArc((12.351848368, -24.00899502), (10.771547634, -23.879574082), (10.190279849, -22.404369706))
            Line((10.190279849, -22.404369706), (11.716353639, -14.089877314))
            ThreePointArc((11.716353639, -14.089877314), (11.87870108, -13.635402806), (12.176961563, -13.256002682))
            ThreePointArc((12.176961563, -13.256002682), (12.424201579, -13.024561994), (12.667043564, -12.788510755))
            ThreePointArc((12.667043564, -12.788510755), (14.243941459, -12.447722593), (15.21779995, -13.733935321))
        make_face()
        with BuildLine():
            Line((4.238854139, -20.055785457), (0.446883349, -26.267902657))
            ThreePointArc((0.446883349, -26.267902657), (-0.120845833, -26.806306653), (-0.882461302, -26.985575074))
            ThreePointArc((-0.882461302, -26.985575074), (-2.505413728, -26.883506134), (-4.119277954, -26.683919299))
            ThreePointArc((-4.119277954, -26.683919299), (-5.321696385, -25.650338094), (-4.924848525, -24.115212052))
            Line((-4.924848525, -24.115212052), (1.196907114, -18.285650075))
            ThreePointArc((1.196907114, -18.285650075), (1.595382366, -18.013397906), (2.059685964, -17.881769871))
            ThreePointArc((2.059685964, -17.881769871), (2.395744761, -17.839854457), (2.730955491, -17.791623931))
            ThreePointArc((2.730955491, -17.791623931), (4.207002942, -18.442797843), (4.238854139, -20.055785457))
        make_face()
        with BuildLine():
            Line((-8.35918988, -18.717007219), (-15.078349566, -21.513851098))
            ThreePointArc((-15.078349566, -21.513851098), (-15.854118052, -21.61572624), (-16.575649243, -21.313091099))
            ThreePointArc((-16.575649243, -21.313091099), (-17.828650719, -20.276568091), (-19.016980106, -19.166493358))
            ThreePointArc((-19.016980106, -19.166493358), (-19.382233263, -17.623544777), (-18.158852151, -16.61486304))
            Line((-18.158852151, -16.61486304), (-9.779717246, -15.496926014))
            ThreePointArc((-9.779717246, -15.496926014), (-9.297318186, -15.510887259), (-8.844319668, -15.677308749))
            ThreePointArc((-8.844319668, -15.677308749), (-8.547805127, -15.840928871), (-8.248264758, -15.99894148))
            ThreePointArc((-8.248264758, -15.99894148), (-7.436867708, -17.393351165), (-8.35918988, -18.717007219))
        make_face()
        with BuildLine():
            Line((-17.764307483, -10.228968392), (-24.844165441, -8.542239649))
            ThreePointArc((-24.844165441, -8.542239649), (-25.531656036, -8.168673095), (-25.937502559, -7.499730729))
            ThreePointArc((-25.937502559, -7.499730729), (-26.341949109, -5.924670212), (-26.650842222, -4.328118399))
            ThreePointArc((-26.650842222, -4.328118399), (-26.039415812, -2.865156358), (-24.456791453, -2.768201066))
            Line((-24.456791453, -2.768201066), (-17.020822019, -6.788902937))
            ThreePointArc((-17.020822019, -6.788902937), (-16.638759195, -7.083744875), (-16.370095793, -7.484648537))
            ThreePointArc((-16.370095793, -7.484648537), (-16.226383986, -7.791306871), (-16.076928218, -8.095207168))
            ThreePointArc((-16.076928218, -8.095207168), (-16.240107663, -9.700235519), (-17.764307483, -10.228968392))
        make_face()
        with BuildLine():
            Line((-20.384063414, 2.166188691), (-25.12035454, 7.692217006))
            ThreePointArc((-25.12035454, 7.692217006), (-25.456969204, 8.398535529), (-25.392111481, 9.178271872))
            ThreePointArc((-25.392111481, 9.178271872), (-24.79351827, 10.690250315), (-24.104988437, 12.16345068))
            ThreePointArc((-24.104988437, 12.16345068), (-22.750426568, 12.987624407), (-21.413067675, 12.135819628))
            Line((-21.413067675, 12.135819628), (-17.760551297, 4.512250316))
            ThreePointArc((-17.760551297, 4.512250316), (-17.624759723, 4.049147284), (-17.643051725, 3.566893022))
            ThreePointArc((-17.643051725, 3.566893022), (-17.707035676, 3.234329538), (-17.764751533, 2.900621137))
            ThreePointArc((-17.764751533, 2.900621137), (-18.840178472, 1.698040395), (-20.384063414, 2.166188691))
        make_face()
        with BuildLine():
            Line((-15.21779995, 13.733935321), (-15.801422014, 20.988508213))
            ThreePointArc((-15.801422014, 20.988508213), (-15.658585386, 21.757789037), (-15.147796863, 22.350486576))
            ThreePointArc((-15.147796863, 22.350486576), (-13.774806152, 23.221858571), (-12.351848368, 24.00899502))
            ThreePointArc((-12.351848368, 24.00899502), (-10.771547634, 23.879574082), (-10.190279849, 22.404369706))
            Line((-10.190279849, 22.404369706), (-11.716353639, 14.089877314))
            ThreePointArc((-11.716353639, 14.089877314), (-11.87870108, 13.635402806), (-12.176961563, 13.256002682))
            ThreePointArc((-12.176961563, 13.256002682), (-12.424201579, 13.024561994), (-12.667043564, 12.788510755))
            ThreePointArc((-12.667043564, 12.788510755), (-14.243941459, 12.447722593), (-15.21779995, 13.733935321))
        make_face()
    extrude(amount=-CUT_EXTRUDE_5_DEPTH, mode=Mode.SUBTRACT)

    # Скругление1
    fillet_1_edges = [part.edges().sort_by_distance(p)[0] for p in [
        (-15, 0, 9),
    ]]
    fillet(fillet_1_edges, radius=FILLET_1_R)


solid = part.part
